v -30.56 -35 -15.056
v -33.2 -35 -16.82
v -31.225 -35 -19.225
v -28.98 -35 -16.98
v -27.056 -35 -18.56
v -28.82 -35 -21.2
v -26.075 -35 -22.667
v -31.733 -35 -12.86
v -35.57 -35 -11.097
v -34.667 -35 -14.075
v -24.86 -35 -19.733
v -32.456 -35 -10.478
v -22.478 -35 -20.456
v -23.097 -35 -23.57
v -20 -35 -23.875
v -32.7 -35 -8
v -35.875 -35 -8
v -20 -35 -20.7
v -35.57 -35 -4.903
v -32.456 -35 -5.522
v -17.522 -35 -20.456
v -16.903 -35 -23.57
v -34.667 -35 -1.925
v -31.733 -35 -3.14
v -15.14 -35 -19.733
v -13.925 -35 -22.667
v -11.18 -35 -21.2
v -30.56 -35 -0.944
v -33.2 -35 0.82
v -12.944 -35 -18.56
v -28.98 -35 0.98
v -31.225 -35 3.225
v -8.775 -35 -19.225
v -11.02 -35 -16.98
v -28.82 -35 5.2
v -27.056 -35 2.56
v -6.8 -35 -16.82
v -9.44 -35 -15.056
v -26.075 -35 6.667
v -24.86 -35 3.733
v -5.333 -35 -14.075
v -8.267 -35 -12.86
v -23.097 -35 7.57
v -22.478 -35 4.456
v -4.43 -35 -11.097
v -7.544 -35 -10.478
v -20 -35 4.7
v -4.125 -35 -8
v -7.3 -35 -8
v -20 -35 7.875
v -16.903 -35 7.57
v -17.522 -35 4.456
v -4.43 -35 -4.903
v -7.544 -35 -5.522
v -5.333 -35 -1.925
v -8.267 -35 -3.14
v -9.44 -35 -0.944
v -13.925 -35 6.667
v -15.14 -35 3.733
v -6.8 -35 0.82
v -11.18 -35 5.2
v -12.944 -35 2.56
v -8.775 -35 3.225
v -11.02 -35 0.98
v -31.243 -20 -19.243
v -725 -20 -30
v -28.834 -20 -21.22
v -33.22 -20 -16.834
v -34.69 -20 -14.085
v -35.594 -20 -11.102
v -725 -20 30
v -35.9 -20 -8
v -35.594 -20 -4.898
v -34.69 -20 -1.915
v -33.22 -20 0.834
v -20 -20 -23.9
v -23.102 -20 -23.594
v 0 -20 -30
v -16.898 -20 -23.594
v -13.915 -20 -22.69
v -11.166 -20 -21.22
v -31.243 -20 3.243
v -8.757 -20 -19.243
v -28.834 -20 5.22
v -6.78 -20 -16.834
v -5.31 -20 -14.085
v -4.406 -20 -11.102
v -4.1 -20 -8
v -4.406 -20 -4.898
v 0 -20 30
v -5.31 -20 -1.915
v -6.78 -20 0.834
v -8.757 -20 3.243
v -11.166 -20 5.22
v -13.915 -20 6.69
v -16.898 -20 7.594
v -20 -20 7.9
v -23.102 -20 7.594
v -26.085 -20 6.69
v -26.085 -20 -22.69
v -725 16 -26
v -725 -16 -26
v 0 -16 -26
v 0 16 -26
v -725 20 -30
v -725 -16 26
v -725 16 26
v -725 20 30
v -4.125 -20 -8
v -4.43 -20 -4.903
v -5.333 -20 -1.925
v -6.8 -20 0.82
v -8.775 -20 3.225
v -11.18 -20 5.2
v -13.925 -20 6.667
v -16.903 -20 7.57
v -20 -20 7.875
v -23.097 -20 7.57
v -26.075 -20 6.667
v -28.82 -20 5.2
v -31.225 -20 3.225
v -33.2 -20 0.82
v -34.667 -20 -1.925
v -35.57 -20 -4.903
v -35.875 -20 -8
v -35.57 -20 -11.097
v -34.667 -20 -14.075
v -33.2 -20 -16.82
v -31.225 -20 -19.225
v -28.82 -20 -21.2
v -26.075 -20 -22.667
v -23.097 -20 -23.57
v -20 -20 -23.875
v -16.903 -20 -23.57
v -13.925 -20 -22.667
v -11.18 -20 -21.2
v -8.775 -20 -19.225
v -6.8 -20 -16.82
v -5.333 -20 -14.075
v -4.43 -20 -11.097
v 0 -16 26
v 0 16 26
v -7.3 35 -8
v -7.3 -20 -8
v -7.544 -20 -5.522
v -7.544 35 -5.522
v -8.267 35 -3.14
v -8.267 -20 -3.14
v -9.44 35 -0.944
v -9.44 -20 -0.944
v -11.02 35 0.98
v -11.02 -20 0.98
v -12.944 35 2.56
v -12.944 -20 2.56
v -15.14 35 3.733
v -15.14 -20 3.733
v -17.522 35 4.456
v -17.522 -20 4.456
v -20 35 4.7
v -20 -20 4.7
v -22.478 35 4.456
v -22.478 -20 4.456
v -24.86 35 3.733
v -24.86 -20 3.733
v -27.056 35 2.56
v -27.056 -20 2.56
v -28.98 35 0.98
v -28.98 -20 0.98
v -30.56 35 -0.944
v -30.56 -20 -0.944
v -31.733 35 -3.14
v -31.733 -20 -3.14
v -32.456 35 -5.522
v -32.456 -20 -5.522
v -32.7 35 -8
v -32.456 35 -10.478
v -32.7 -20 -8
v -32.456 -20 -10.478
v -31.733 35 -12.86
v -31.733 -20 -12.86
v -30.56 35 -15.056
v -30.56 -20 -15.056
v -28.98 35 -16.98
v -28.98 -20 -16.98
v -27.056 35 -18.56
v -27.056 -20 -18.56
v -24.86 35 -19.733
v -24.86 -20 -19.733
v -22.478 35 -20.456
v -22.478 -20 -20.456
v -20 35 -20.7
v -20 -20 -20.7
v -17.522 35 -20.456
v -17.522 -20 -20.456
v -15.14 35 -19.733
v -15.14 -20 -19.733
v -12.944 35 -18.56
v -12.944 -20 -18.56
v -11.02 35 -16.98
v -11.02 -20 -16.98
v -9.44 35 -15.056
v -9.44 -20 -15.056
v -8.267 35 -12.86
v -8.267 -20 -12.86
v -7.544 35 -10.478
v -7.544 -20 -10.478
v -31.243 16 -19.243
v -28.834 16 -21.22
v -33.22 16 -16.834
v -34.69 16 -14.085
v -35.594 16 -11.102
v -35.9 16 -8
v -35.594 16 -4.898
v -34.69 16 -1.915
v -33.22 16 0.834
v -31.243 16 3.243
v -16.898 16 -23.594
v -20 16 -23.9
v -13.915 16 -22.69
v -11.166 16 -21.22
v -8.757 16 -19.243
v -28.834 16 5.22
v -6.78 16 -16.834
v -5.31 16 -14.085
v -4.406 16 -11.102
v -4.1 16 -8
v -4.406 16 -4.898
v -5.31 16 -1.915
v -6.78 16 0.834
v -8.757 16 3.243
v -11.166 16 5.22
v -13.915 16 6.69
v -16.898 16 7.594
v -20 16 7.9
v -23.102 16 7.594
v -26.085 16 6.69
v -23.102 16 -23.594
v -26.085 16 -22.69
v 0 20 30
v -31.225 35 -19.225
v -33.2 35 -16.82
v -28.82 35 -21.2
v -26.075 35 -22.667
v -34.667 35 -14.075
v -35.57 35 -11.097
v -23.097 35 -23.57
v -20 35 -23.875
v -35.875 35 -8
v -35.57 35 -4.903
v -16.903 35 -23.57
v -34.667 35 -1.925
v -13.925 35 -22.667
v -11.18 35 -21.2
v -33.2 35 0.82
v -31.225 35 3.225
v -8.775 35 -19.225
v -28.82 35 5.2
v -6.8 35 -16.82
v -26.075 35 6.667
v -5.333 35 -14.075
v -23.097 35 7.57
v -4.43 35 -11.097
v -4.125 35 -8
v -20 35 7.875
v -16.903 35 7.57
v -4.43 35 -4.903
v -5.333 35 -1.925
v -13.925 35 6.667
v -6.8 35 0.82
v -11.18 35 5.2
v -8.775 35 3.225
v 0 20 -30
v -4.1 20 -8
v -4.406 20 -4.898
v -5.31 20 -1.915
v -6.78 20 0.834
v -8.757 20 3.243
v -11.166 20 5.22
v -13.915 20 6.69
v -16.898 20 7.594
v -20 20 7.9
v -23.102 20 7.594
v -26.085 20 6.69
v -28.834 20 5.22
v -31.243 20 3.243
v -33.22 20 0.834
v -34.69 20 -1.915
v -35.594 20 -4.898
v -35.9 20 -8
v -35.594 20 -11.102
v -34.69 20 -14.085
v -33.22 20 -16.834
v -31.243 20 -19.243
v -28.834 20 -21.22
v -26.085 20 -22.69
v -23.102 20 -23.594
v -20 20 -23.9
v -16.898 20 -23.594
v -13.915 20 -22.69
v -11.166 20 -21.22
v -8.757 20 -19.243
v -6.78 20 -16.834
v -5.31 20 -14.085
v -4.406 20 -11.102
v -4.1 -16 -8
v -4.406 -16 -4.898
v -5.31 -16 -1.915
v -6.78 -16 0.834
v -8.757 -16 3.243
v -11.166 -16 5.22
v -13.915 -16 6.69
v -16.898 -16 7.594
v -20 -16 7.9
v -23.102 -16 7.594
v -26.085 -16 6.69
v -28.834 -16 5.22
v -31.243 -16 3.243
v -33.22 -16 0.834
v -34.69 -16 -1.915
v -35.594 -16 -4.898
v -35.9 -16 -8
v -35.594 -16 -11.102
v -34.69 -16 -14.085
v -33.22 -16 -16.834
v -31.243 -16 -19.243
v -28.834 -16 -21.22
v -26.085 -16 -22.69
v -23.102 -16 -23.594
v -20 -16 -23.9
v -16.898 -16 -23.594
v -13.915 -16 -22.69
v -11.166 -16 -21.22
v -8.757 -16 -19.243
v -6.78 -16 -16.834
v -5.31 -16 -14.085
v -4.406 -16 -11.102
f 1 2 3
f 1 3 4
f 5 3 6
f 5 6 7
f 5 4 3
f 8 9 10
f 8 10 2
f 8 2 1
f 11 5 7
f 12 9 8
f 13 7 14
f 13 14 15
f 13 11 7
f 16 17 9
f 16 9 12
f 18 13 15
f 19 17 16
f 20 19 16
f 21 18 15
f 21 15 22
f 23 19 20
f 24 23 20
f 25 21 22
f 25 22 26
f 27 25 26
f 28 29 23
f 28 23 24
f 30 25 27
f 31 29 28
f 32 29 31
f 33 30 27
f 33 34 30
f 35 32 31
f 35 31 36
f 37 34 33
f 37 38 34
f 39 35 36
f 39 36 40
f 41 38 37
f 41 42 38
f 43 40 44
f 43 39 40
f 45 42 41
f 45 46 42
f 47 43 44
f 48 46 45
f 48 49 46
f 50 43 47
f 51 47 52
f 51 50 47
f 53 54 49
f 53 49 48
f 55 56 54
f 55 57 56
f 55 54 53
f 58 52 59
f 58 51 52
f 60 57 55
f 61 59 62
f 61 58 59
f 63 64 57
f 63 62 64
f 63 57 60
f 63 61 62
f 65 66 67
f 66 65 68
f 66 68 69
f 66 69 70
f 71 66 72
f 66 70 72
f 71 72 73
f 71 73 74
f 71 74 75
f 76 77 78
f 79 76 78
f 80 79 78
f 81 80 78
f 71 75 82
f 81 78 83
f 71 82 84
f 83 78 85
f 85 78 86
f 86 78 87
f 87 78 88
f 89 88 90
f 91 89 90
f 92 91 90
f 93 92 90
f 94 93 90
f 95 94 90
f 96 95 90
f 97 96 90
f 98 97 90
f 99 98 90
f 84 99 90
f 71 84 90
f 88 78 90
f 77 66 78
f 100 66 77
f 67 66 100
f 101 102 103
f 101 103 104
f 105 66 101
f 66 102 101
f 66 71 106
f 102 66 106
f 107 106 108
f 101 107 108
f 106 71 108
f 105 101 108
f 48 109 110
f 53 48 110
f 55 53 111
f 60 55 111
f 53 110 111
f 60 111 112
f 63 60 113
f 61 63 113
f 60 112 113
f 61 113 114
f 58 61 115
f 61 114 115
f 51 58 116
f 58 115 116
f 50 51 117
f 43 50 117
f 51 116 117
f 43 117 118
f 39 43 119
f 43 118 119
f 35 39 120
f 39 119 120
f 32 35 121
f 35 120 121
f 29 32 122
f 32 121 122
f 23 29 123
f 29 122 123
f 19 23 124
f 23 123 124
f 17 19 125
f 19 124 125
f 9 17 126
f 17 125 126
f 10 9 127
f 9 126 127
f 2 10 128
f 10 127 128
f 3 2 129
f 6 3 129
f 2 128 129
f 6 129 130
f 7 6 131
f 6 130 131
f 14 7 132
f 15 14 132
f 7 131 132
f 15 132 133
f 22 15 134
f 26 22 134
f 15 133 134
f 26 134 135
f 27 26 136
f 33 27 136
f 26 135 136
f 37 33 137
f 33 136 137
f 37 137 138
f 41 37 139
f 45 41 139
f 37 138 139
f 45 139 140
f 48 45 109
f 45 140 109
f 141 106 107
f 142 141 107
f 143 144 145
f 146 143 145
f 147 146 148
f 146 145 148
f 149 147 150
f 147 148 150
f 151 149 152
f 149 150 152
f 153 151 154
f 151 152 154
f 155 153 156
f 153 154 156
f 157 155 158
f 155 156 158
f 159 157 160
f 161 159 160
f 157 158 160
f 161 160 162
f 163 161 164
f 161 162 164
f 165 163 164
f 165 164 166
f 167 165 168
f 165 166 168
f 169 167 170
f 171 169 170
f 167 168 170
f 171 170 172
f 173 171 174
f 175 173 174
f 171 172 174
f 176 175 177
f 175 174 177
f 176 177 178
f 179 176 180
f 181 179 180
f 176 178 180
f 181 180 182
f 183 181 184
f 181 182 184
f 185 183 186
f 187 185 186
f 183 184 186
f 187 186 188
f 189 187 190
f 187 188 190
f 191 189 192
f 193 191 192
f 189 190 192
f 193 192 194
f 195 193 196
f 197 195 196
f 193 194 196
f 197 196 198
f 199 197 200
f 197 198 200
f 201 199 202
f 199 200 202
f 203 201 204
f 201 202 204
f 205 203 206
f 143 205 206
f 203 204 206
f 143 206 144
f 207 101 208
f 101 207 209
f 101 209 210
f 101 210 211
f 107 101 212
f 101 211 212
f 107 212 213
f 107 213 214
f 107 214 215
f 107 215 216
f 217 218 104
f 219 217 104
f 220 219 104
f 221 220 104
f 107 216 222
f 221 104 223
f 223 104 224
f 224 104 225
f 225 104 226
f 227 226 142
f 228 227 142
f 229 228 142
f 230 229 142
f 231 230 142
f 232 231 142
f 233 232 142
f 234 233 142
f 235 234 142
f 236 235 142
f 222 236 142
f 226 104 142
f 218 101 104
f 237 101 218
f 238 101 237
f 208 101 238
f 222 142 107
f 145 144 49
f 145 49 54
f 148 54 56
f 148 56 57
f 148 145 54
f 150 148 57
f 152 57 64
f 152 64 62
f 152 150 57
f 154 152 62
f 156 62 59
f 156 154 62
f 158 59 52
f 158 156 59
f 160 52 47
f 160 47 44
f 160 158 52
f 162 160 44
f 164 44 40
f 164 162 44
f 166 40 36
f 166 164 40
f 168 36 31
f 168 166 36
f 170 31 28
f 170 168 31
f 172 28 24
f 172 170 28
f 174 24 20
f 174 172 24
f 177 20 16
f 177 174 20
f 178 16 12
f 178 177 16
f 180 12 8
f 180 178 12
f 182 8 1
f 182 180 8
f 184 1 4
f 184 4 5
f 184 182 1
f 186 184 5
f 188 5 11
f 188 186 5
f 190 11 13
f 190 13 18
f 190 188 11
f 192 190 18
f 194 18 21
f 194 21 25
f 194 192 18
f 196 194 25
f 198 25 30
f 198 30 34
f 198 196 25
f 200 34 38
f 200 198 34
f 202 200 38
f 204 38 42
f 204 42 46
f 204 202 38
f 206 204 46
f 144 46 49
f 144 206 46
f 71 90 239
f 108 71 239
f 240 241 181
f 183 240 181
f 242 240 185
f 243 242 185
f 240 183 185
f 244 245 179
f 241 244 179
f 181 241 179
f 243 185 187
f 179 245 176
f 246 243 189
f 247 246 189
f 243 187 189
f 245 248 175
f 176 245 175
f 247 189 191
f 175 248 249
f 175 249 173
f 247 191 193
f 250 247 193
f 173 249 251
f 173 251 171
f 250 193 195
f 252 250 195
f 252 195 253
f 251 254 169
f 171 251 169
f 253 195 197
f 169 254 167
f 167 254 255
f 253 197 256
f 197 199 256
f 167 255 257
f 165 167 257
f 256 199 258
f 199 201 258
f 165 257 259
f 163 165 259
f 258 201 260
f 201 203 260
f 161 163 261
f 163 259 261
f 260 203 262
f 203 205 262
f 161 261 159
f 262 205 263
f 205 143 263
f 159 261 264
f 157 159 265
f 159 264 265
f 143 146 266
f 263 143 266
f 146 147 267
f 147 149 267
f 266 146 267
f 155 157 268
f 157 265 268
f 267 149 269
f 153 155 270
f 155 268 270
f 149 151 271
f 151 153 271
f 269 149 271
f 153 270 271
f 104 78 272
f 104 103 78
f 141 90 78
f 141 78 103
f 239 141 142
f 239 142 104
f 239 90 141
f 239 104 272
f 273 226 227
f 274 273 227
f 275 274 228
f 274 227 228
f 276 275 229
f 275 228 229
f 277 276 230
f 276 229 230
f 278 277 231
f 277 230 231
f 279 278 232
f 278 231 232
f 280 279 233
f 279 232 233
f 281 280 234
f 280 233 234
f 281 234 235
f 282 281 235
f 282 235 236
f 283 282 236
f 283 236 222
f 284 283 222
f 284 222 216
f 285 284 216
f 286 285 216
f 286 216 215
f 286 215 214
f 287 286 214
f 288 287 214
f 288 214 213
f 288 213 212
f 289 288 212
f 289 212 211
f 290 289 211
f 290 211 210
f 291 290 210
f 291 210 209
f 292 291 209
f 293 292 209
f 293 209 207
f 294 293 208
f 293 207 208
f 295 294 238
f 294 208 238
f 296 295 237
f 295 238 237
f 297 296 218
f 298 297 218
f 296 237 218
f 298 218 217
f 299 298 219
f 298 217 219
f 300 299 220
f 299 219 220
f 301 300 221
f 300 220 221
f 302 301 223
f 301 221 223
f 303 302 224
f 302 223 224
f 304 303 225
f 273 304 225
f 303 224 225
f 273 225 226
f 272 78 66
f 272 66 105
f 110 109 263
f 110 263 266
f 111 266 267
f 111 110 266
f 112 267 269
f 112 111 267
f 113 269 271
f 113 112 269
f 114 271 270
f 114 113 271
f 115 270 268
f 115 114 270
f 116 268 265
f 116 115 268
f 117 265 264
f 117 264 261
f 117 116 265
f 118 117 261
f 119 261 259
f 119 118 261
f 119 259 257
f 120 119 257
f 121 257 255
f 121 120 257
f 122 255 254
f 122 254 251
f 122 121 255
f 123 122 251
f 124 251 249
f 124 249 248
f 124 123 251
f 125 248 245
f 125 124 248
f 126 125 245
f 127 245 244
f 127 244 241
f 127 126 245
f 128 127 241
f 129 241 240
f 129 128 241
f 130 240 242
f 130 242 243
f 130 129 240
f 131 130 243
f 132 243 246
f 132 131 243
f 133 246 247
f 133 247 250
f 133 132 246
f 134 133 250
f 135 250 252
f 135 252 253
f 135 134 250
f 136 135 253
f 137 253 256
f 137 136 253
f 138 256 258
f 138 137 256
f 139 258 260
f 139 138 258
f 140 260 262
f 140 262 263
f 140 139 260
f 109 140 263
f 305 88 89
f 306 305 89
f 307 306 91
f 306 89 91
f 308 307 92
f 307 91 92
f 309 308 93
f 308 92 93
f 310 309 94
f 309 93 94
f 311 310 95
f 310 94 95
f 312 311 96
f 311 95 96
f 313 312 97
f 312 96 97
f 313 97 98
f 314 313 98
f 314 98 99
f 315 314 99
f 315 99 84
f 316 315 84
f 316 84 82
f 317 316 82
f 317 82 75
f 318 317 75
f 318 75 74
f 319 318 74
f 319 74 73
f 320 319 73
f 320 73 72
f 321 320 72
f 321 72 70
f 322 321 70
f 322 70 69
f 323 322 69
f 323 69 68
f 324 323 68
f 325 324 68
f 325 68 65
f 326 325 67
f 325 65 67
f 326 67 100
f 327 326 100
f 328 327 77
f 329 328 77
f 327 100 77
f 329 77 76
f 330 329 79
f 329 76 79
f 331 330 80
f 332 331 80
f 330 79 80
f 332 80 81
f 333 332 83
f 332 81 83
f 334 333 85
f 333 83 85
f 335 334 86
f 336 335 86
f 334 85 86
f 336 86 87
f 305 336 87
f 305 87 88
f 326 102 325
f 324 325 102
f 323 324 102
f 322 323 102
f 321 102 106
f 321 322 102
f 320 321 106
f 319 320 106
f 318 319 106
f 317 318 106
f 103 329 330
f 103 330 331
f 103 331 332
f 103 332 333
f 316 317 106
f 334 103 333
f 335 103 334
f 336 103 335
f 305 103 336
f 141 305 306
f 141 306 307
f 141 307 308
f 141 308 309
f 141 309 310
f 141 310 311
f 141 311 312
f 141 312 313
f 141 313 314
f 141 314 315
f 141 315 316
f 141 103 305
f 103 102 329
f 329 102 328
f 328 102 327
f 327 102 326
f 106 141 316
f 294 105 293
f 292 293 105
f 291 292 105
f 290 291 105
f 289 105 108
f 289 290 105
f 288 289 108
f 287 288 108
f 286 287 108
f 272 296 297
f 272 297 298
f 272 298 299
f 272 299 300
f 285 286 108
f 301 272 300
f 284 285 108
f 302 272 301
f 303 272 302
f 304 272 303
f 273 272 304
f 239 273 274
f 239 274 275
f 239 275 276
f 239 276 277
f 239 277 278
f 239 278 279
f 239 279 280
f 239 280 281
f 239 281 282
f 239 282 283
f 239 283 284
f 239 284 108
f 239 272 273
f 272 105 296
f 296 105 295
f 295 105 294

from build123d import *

# Parameters (mm, degrees)
F0_W        = 40
F0_H        = 60
F0_W_2      = 32
F0_H_2      = 52
F1_DEPTH    = 725
F2_R        = 15.9
F3_DEPTH    = 40
F4_R        = 15.875
F4_R_2      = 12.7
F5_DEPTH    = 55
F5_FACE_R   = 15.875
F5_FACE_R_2 = 12.7
F6_DEPTH    = 15


with BuildPart() as f1:
    # F0 (on Right) → F1 (new body)
    with BuildSketch(Plane.YZ):
        Rectangle(F0_W, F0_H)
        Rectangle(F0_W_2, F0_H_2, mode=Mode.SUBTRACT)
    extrude(amount=-F1_DEPTH)

    # F2 (on face) → F3 (cut)
    with BuildSketch(Plane.XZ.offset(20)):
        with Locations((-20, -8)):
            Circle(F2_R)
    extrude(amount=-F3_DEPTH, mode=Mode.SUBTRACT)


with BuildPart() as f5:
    # F4 (on face) → F5 (new body)
    with BuildSketch(Plane.XZ.offset(20)):
        with Locations((-20, -8)):
            Circle(F4_R)
        with Locations((-20, -8)):
            Circle(F4_R_2, mode=Mode.SUBTRACT)
    extrude(amount=-F5_DEPTH)

    # F5_face (on face) → F6 (join)
    with BuildSketch(Plane(origin=(-20, -20, -8), x_dir=(1, 0, 0), z_dir=(0, -1, 0))):
        Circle(F5_FACE_R)
        Circle(F5_FACE_R_2, mode=Mode.SUBTRACT)
    extrude(amount=F6_DEPTH)


solid = Compound([f1.part, f5.part])
